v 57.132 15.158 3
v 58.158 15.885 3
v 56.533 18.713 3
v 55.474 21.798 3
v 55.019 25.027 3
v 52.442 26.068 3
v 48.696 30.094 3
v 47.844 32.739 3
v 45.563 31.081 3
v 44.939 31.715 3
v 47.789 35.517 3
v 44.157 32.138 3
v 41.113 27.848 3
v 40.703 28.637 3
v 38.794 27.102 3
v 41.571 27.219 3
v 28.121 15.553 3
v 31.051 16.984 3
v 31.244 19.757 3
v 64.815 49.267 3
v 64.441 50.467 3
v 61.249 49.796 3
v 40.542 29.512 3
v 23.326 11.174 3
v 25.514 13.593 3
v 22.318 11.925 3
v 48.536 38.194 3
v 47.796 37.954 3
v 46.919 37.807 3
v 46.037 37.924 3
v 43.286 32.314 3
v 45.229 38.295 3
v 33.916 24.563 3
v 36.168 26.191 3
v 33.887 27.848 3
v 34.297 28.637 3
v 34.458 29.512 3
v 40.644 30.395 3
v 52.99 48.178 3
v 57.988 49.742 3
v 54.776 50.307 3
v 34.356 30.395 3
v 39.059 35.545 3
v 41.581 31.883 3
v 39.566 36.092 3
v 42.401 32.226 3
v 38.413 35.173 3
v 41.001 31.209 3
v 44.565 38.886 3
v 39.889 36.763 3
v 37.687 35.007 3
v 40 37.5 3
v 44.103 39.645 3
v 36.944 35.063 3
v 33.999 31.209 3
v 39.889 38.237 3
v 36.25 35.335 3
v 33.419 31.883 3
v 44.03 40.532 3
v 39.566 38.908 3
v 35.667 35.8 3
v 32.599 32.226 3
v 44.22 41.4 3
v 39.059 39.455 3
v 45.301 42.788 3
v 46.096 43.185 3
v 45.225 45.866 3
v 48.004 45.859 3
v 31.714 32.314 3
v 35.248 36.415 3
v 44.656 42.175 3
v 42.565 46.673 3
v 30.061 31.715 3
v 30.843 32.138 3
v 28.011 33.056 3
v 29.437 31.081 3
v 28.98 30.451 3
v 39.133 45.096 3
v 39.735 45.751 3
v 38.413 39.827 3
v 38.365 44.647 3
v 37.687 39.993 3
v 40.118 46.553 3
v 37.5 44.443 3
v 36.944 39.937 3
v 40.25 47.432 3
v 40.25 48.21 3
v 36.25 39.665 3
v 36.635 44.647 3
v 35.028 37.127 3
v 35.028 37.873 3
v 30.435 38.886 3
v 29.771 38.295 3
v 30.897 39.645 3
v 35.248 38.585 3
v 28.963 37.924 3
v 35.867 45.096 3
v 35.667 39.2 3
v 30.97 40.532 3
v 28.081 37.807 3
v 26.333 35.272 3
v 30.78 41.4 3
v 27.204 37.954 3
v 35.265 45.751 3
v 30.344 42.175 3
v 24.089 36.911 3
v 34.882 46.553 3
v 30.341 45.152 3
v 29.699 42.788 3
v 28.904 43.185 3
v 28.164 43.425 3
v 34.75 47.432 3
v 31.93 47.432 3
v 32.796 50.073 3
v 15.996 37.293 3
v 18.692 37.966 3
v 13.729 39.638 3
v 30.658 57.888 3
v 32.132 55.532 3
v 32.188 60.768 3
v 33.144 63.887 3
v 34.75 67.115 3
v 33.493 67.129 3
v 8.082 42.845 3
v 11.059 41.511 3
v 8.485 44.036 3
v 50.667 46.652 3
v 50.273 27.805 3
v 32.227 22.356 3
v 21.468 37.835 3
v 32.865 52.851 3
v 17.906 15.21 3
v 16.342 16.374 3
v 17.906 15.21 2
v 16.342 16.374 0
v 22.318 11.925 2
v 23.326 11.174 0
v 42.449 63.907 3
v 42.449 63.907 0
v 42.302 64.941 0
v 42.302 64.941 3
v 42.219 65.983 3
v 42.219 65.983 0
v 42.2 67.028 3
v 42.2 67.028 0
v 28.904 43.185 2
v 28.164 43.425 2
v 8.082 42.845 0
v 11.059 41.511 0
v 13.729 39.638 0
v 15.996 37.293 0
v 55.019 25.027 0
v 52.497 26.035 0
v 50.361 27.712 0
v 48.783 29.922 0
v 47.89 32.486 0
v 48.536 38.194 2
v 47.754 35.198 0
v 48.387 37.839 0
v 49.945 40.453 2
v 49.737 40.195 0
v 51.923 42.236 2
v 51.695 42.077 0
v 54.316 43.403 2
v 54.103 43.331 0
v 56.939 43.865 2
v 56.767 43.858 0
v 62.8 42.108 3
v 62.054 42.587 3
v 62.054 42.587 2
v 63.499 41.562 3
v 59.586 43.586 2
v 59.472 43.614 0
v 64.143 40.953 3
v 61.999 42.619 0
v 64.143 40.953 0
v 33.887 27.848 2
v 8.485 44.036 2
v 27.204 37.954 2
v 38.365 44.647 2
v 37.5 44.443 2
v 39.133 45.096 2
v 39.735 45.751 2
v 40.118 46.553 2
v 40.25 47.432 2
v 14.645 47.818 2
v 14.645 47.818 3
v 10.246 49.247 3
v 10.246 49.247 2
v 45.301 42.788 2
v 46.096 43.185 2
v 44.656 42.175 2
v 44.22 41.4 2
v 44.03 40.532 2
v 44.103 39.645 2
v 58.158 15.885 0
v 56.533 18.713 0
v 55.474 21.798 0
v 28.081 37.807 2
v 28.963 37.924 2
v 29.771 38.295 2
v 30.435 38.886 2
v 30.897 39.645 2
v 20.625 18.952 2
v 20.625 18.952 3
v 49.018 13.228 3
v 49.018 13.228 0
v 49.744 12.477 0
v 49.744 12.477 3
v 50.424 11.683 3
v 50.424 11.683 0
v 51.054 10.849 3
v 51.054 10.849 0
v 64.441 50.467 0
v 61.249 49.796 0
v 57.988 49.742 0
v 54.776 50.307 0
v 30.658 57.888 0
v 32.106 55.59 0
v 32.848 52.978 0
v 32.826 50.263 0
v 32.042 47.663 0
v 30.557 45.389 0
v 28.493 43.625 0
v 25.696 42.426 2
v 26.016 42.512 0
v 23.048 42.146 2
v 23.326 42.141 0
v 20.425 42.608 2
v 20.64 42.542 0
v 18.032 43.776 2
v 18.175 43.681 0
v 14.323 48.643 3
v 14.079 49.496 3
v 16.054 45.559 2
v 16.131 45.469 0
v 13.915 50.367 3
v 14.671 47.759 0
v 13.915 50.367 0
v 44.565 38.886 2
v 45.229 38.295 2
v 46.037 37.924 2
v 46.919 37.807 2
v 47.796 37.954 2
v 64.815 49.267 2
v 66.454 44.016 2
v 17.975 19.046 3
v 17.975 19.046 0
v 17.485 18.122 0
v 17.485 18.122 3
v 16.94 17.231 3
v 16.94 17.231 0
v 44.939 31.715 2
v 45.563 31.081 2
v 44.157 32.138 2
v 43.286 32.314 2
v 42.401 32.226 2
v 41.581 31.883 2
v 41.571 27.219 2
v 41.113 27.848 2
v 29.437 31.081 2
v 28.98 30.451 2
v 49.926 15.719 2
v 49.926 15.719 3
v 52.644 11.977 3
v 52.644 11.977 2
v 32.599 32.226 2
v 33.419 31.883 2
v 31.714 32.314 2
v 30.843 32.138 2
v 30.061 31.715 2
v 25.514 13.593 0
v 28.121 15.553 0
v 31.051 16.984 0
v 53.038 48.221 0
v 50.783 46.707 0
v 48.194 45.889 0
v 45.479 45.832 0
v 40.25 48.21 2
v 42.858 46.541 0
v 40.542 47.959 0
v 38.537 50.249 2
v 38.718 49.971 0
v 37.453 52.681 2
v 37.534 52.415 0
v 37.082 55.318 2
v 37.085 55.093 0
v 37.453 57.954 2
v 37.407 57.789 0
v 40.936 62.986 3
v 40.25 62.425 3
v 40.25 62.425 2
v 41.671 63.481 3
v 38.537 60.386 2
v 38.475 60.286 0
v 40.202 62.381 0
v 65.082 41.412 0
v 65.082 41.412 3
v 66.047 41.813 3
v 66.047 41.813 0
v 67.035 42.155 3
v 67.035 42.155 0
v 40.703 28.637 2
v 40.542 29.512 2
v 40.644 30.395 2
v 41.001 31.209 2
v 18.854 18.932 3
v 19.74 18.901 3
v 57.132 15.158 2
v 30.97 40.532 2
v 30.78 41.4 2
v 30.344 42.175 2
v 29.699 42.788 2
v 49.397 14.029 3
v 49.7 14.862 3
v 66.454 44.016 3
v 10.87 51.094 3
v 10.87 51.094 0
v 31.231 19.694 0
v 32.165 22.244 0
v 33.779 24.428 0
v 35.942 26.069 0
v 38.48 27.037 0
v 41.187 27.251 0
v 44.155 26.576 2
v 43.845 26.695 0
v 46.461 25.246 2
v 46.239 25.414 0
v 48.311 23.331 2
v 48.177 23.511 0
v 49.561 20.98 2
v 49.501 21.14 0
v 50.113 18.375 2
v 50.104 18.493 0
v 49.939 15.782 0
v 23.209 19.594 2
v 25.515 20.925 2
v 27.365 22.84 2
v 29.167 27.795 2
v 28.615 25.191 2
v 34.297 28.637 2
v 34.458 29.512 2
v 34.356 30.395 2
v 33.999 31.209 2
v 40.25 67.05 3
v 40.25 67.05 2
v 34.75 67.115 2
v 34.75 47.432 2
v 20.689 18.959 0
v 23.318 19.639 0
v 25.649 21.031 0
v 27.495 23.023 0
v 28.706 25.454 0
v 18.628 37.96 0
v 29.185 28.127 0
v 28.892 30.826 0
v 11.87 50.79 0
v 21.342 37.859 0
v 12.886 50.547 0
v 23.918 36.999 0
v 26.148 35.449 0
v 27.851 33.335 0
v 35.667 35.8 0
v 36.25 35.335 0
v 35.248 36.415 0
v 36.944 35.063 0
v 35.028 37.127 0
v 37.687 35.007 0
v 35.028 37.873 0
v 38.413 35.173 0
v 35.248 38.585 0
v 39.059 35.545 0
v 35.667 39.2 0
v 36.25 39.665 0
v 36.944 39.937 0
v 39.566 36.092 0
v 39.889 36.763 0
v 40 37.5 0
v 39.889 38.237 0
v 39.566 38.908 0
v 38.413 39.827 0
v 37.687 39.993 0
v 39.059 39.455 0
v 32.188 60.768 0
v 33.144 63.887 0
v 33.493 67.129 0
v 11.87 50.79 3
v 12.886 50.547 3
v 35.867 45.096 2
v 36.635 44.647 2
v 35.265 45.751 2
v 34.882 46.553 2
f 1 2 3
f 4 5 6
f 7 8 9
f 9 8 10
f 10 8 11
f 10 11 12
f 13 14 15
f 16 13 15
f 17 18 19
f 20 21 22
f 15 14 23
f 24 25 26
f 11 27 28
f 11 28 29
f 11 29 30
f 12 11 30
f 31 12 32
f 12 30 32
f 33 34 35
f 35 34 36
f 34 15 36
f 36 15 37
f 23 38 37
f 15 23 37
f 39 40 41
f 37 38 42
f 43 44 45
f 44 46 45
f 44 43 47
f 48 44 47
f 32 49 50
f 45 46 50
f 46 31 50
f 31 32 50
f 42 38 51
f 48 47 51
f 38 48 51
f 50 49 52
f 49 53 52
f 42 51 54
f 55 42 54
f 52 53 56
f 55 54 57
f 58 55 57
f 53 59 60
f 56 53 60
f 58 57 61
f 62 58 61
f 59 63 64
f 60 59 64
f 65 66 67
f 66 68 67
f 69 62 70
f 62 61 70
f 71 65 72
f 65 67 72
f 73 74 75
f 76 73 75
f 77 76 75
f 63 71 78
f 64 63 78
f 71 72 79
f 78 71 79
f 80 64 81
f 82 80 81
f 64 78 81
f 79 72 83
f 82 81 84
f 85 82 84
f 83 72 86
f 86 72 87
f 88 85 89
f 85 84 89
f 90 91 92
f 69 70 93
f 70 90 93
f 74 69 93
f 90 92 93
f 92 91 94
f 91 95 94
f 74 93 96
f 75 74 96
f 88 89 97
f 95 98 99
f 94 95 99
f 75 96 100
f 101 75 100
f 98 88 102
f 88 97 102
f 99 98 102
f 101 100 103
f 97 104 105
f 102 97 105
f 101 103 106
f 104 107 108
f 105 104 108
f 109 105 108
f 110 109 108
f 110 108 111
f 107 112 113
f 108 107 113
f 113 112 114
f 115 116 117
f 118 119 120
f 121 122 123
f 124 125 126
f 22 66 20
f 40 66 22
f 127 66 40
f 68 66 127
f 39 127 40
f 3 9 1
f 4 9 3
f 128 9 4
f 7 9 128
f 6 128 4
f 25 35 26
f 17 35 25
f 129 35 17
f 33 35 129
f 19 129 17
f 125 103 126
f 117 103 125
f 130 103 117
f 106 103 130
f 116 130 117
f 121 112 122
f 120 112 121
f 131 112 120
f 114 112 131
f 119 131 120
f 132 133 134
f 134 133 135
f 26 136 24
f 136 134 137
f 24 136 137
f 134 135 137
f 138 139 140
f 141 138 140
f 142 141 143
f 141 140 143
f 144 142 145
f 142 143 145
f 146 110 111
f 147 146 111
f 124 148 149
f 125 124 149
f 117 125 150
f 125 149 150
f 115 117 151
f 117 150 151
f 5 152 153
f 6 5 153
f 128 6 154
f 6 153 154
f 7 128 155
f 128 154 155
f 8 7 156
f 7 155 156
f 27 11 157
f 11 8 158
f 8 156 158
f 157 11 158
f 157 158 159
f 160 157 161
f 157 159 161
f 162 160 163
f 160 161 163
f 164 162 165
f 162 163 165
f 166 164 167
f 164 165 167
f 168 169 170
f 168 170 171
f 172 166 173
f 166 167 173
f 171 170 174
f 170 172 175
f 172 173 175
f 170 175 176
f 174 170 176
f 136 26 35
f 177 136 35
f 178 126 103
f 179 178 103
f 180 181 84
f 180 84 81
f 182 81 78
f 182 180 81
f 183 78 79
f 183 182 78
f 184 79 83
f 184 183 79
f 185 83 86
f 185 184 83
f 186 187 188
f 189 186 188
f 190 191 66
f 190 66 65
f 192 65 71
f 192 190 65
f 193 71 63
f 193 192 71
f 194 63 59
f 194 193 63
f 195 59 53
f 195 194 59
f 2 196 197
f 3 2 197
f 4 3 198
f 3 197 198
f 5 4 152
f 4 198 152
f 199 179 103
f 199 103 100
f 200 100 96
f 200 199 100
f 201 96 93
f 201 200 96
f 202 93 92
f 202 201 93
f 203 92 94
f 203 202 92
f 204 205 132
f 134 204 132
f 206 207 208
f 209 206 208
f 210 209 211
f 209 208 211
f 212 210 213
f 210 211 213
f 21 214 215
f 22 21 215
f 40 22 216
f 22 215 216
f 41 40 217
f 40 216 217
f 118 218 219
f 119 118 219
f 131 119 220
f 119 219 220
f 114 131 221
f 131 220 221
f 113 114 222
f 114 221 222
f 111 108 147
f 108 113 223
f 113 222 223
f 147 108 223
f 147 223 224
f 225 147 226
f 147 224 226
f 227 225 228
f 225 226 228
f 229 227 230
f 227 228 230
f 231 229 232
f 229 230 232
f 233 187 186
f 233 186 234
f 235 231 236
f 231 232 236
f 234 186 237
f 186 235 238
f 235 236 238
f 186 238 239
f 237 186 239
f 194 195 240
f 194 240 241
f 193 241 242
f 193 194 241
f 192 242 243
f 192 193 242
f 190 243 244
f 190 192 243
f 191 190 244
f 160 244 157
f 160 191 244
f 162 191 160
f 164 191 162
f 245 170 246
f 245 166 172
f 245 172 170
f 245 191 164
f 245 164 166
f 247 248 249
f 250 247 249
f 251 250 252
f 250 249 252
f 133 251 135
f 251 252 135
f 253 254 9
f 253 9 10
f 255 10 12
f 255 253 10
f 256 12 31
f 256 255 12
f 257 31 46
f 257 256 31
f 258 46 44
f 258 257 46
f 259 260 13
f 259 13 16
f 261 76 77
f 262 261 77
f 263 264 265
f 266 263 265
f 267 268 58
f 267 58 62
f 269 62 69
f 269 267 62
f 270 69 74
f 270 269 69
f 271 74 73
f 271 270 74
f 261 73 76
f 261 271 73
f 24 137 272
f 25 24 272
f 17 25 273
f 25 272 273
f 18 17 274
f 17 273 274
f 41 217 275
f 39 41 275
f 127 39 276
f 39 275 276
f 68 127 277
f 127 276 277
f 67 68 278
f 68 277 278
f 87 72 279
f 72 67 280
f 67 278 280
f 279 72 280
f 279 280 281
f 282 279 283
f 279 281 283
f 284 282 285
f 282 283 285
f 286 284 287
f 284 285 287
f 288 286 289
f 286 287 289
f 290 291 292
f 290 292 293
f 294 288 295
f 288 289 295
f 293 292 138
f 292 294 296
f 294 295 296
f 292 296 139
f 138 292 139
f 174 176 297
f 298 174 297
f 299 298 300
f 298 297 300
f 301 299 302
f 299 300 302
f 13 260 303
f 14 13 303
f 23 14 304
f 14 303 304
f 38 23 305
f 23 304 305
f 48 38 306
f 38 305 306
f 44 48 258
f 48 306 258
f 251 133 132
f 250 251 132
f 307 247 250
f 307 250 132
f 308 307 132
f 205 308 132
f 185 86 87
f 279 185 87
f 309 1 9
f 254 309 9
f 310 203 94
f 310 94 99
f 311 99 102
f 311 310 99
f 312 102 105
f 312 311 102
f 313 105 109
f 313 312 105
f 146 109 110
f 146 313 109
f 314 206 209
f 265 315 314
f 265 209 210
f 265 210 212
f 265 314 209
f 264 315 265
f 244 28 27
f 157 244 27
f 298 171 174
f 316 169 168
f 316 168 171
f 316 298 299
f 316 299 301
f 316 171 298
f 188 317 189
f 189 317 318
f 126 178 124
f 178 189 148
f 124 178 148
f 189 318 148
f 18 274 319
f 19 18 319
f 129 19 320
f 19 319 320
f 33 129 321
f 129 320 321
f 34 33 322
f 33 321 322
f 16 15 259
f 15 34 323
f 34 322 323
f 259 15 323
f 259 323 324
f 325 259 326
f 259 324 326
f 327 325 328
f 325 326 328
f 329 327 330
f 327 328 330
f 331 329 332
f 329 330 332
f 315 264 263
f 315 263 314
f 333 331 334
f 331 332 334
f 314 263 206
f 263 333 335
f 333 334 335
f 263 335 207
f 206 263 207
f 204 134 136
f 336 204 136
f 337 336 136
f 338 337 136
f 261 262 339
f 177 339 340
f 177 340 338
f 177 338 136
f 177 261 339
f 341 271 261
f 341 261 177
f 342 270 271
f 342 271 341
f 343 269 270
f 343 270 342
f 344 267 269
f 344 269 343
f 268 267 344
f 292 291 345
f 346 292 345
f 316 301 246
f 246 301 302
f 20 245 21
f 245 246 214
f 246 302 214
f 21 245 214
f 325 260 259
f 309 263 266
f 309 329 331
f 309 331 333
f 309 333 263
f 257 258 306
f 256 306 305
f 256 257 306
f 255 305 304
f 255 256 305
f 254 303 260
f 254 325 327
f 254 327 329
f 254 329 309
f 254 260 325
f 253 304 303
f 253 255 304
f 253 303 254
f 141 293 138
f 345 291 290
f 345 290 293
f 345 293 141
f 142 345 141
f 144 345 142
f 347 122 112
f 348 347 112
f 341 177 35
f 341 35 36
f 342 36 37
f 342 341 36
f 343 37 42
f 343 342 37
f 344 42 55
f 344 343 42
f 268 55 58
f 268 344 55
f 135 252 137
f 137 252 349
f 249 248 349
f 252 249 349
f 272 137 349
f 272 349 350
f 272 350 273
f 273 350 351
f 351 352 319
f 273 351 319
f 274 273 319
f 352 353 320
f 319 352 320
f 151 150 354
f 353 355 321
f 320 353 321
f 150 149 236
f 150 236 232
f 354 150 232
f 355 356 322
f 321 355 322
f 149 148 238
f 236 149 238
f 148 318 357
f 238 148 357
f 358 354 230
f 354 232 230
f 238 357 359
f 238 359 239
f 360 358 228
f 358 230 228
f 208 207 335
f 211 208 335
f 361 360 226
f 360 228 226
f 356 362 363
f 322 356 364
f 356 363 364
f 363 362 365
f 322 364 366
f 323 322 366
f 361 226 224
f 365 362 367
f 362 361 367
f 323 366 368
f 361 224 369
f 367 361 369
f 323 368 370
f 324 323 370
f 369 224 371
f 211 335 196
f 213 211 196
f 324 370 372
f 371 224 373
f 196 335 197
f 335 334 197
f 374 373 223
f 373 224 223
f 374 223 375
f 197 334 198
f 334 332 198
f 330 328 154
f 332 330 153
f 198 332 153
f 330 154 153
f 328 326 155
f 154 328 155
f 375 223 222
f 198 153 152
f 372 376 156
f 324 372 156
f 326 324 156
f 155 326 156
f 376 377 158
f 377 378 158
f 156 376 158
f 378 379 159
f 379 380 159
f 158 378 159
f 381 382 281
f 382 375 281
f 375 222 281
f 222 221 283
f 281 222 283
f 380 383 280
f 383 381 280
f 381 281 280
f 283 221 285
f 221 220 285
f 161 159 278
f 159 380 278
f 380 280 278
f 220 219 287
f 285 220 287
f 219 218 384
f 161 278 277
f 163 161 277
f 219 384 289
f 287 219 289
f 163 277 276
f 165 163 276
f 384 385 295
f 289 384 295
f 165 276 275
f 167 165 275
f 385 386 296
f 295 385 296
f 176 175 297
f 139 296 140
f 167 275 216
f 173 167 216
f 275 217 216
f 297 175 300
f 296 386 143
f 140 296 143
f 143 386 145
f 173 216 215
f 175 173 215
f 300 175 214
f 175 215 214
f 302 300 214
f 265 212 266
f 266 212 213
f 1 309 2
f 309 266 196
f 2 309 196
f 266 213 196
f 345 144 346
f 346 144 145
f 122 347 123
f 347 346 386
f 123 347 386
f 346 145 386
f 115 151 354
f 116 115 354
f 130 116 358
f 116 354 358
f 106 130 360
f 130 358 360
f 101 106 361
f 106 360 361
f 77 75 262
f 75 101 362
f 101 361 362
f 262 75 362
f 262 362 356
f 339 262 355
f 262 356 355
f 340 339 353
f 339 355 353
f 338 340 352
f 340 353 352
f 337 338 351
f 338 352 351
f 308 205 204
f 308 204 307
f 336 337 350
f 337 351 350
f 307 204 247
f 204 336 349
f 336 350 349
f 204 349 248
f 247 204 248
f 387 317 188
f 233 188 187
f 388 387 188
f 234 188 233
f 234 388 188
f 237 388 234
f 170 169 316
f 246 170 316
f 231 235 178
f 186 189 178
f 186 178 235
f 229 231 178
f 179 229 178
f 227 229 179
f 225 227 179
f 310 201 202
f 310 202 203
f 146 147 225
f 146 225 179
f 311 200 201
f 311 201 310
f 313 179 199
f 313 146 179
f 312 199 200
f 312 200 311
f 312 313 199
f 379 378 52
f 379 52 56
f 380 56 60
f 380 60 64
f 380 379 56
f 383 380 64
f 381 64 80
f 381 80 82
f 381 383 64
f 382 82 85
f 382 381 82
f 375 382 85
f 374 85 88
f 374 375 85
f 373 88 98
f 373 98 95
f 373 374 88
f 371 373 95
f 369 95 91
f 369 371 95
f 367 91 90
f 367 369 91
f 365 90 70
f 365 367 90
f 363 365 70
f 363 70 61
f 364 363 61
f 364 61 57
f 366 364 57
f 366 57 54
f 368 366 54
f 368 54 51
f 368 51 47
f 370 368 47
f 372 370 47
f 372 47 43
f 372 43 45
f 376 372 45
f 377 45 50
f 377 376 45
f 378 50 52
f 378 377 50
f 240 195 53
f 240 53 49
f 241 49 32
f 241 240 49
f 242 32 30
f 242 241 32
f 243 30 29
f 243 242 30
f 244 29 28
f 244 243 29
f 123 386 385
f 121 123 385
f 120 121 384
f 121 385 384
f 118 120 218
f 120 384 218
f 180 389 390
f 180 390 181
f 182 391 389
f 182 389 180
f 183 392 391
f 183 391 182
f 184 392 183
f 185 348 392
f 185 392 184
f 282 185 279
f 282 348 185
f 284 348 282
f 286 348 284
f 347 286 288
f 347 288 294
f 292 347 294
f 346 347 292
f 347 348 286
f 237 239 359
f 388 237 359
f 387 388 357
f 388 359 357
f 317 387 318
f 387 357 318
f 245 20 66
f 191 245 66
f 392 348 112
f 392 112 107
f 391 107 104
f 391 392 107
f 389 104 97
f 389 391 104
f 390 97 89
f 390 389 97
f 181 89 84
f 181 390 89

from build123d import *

# Parameters (mm, degrees)
F0_R        = 2.5
F1_DEPTH    = 3
F3_DEPTH    = 1
F4_T1_DEPTH = 1


# Not quite as in the source:
# - a fillet or chamfer that OpenCascade refuses, or shapes differently, is made with other operations: its cross-section is extruded or revolved along the edge and cut away or added


with BuildPart() as f1:
    # F0 (on Top) → F1 (new body)
    with BuildSketch(Plane.XY):
        with BuildLine():
            Line((42.1995138221, 67.0275468757), (33.4926469464, 67.1294207869))
            ThreePointArc((33.4926469464, 67.1294207869), (32.7404851321, 62.3046461892), (30.658157874, 57.8878475177))
            ThreePointArc((30.658157874, 57.8878475177), (27.294204133, 42.9798709067), (13.9152540739, 50.3668626301))
            ThreePointArc((13.9152540739, 50.3668626301), (12.375918121, 50.6607466073), (10.86986377, 51.0940170307))
            Line((10.86986377, 51.0940170307), (8.0824060906, 42.844775322))
            ThreePointArc((8.0824060906, 42.844775322), (12.4386086282, 40.6384895823), (15.9957592753, 37.2932128243))
            ThreePointArc((15.9957592753, 37.2932128243), (29.1345687017, 29.4870845738), (17.9747991522, 19.0456529188))
            ThreePointArc((17.9747991522, 19.0456529188), (17.2196179112, 17.6724725733), (16.3421568627, 16.3740176929))
            Line((16.3421568627, 16.3740176929), (23.3262801503, 11.1738320243))
            ThreePointArc((23.3262801503, 11.1738320243), (26.7707231948, 14.6350470461), (31.0514904559, 16.9843509793))
            ThreePointArc((31.0514904559, 16.9843509793), (42.5356749941, 27.0678750109), (49.017508165, 13.2277236335))
            ThreePointArc((49.017508165, 13.2277236335), (50.0901164433, 12.0851675302), (51.0538700425, 10.8494078578))
            Line((51.0538700425, 10.8494078578), (58.1577532953, 15.8847580755))
            ThreePointArc((58.1577532953, 15.8847580755), (55.9303336315, 20.230192341), (55.0188426496, 25.0274187796))
            ThreePointArc((55.0188426496, 25.0274187796), (48.977649601, 39.065507608), (64.1434123595, 40.9532553024))
            ThreePointArc((64.1434123595, 40.9532553024), (65.5615019731, 41.620297142), (67.0345955027, 42.1550105429))
            Line((67.0345955027, 42.1550105429), (64.4409135174, 50.4672137913))
            ThreePointArc((64.4409135174, 50.4672137913), (59.6198494134, 49.6916248415), (54.7757497452, 50.307169899))
            ThreePointArc((54.7757497452, 50.307169899), (39.5579025703, 48.8996619005), (42.4490262494, 63.9065055152))
            ThreePointArc((42.4490262494, 63.9065055152), (42.2528455514, 65.4613161473), (42.1995138221, 67.0275468757))
        make_face()
        with Locations((37.5, 37.5)):
            Circle(F0_R, mode=Mode.SUBTRACT)
    extrude(amount=F1_DEPTH)

    # F2 (on face) → F3 (cut)
    with BuildSketch(Plane.XY.offset(3)):
        Polygon((40.25, 67.1147092408), (34.75, 67.1147092408), (40.25, 67.0503569865), align=None)
        with BuildLine():
            Line((31.7569283434, 42.2575582148), (28.1635644564, 43.4251129174))
            ThreePointArc((28.1635644564, 43.4251129174), (20.4254111601, 42.6084822131), (14.6451171229, 47.8175227185))
            Line((14.6451171229, 47.8175227185), (10.2457371637, 49.2469679185))
            Line((10.2457371637, 49.2469679185), (8.4849410638, 44.0360430191))
            Line((8.4849410638, 44.0360430191), (30.0573348743, 37.0267473751))
            Line((30.0573348743, 37.0267473751), (31.7569283434, 42.2575582148))
        make_face()
        with BuildLine():
            Line((31.2005865164, 33.5081806175), (28.9797655003, 30.4514827223))
            ThreePointArc((28.9797655003, 30.4514827223), (27.3652065793, 22.8397088401), (20.6249055731, 18.9520045705))
            Line((20.6249055731, 18.9520045705), (17.9059392288, 15.2096684519))
            Line((17.9059392288, 15.2096684519), (22.3177073919, 11.9247874969))
            Line((22.3177073919, 11.9247874969), (35.6501799855, 30.2753617299))
            Line((35.6501799855, 30.2753617299), (31.2005865164, 33.5081806175))
        make_face()
        with BuildLine():
            Line((52.6444673021, 11.9768495643), (57.1318860772, 15.1576063845))
            Line((57.1318860772, 15.1576063845), (43.7994134836, 33.5081806175))
            Line((43.7994134836, 33.5081806175), (39.3498200145, 30.2753617299))
            Line((39.3498200145, 30.2753617299), (41.5706410307, 27.2186638347))
            ThreePointArc((41.5706410307, 27.2186638347), (48.3109420369, 23.3309595651), (49.9255009579, 15.7191856828))
            Line((49.9255009579, 15.7191856828), (52.6444673021, 11.9768495643))
        make_face()
        with BuildLine():
            Line((66.4538563054, 44.0161570789), (64.8154654671, 49.2668538587))
            Line((64.8154654671, 49.2668538587), (43.2430716566, 42.2575582148))
            Line((43.2430716566, 42.2575582148), (44.9426651257, 37.0267473751))
            Line((44.9426651257, 37.0267473751), (48.5360290127, 38.1943020778))
            ThreePointArc((48.5360290127, 38.1943020778), (54.3163230499, 43.4033425831), (62.0544763461, 42.5867118789))
            Line((62.0544763461, 42.5867118789), (66.4538563054, 44.0161570789))
        make_face()
        with BuildLine():
            Line((34.75, 44.4321520627), (37.5, 44.4321520627))
            Line((37.5, 44.4321520627), (40.25, 44.4321520627))
            Line((40.25, 44.4321520627), (40.25, 48.2104384478))
            ThreePointArc((40.25, 48.2104384478), (37.0821171737, 55.3175067985), (40.25, 62.4245751493))
            Line((40.25, 62.4245751493), (40.25, 67.0503569865))
            Line((40.25, 67.0503569865), (34.75, 67.1147092408))
            Line((34.75, 67.1147092408), (34.75, 44.4321520627))
        make_face()
    extrude(amount=-F3_DEPTH, mode=Mode.SUBTRACT)

    # F4: fillet of radius 3 on 10 edges, made by hand

    # F4_s2 → F4_t1 (join)
    with BuildSketch(Plane.XY.offset(2)):
        with BuildLine():
            ThreePointArc((37.25, 44.4321520627), (39.3713203436, 45.3108317191), (40.25, 47.4321520627))
            Line((40.25, 47.4321520627), (40.25, 44.4321520627))
            Line((40.25, 44.4321520627), (37.25, 44.4321520627))
        make_face()
        with BuildLine():
            ThreePointArc((34.75, 47.4321520627), (35.6286796564, 45.3108317191), (37.75, 44.4321520627))
            Line((37.75, 44.4321520627), (34.75, 44.4321520627))
            Line((34.75, 44.4321520627), (34.75, 47.4321520627))
        make_face()
        with BuildLine():
            ThreePointArc((30.8298773603, 39.4043886659), (30.6497273839, 41.6934111482), (28.9037587945, 43.1846091979))
            Line((28.9037587945, 43.1846091979), (31.7569283434, 42.2575582148))
            Line((31.7569283434, 42.2575582148), (30.8298773603, 39.4043886659))
        make_face()
        with BuildLine():
            ThreePointArc((27.2041653254, 37.9537983583), (29.4931878078, 38.1339483346), (30.9843858575, 39.879916924))
            Line((30.9843858575, 39.879916924), (30.0573348743, 37.0267473751))
            Line((30.0573348743, 37.0267473751), (27.2041653254, 37.9537983583))
        make_face()
        with BuildLine():
            ThreePointArc((33.6276374995, 31.7448248606), (31.3949783475, 32.2808388993), (29.4372307595, 31.0811296344))
            Line((29.4372307595, 31.0811296344), (31.2005865164, 33.5081806175))
            Line((31.2005865164, 33.5081806175), (33.6276374995, 31.7448248606))
        make_face()
        with BuildLine():
            ThreePointArc((33.8868242286, 27.8483107468), (34.4228382672, 30.0809698988), (33.2231290023, 32.0387174868))
            Line((33.2231290023, 32.0387174868), (35.6501799855, 30.2753617299))
            Line((35.6501799855, 30.2753617299), (33.8868242286, 27.8483107468))
        make_face()
        with BuildLine():
            ThreePointArc((41.1131757714, 27.8483107468), (40.5771617328, 30.0809698988), (41.7768709977, 32.0387174868))
            Line((41.7768709977, 32.0387174868), (39.3498200145, 30.2753617299))
            Line((39.3498200145, 30.2753617299), (41.1131757714, 27.8483107468))
        make_face()
        with BuildLine():
            ThreePointArc((45.5627692405, 31.0811296344), (43.6050216525, 32.2808388993), (41.3723625005, 31.7448248606))
            Line((41.3723625005, 31.7448248606), (43.7994134836, 33.5081806175))
            Line((43.7994134836, 33.5081806175), (45.5627692405, 31.0811296344))
        make_face()
        with BuildLine():
            ThreePointArc((44.0156141425, 39.879916924), (45.5068121922, 38.1339483346), (47.7958346746, 37.9537983583))
            Line((47.7958346746, 37.9537983583), (44.9426651257, 37.0267473751))
            Line((44.9426651257, 37.0267473751), (44.0156141425, 39.879916924))
        make_face()
        with BuildLine():
            ThreePointArc((46.0962412055, 43.1846091979), (44.3502726161, 41.6934111482), (44.1701226397, 39.4043886659))
            Line((44.1701226397, 39.4043886659), (43.2430716566, 42.2575582148))
            Line((43.2430716566, 42.2575582148), (46.0962412055, 43.1846091979))
        make_face()
    extrude(amount=F4_T1_DEPTH)


solid = f1.part
